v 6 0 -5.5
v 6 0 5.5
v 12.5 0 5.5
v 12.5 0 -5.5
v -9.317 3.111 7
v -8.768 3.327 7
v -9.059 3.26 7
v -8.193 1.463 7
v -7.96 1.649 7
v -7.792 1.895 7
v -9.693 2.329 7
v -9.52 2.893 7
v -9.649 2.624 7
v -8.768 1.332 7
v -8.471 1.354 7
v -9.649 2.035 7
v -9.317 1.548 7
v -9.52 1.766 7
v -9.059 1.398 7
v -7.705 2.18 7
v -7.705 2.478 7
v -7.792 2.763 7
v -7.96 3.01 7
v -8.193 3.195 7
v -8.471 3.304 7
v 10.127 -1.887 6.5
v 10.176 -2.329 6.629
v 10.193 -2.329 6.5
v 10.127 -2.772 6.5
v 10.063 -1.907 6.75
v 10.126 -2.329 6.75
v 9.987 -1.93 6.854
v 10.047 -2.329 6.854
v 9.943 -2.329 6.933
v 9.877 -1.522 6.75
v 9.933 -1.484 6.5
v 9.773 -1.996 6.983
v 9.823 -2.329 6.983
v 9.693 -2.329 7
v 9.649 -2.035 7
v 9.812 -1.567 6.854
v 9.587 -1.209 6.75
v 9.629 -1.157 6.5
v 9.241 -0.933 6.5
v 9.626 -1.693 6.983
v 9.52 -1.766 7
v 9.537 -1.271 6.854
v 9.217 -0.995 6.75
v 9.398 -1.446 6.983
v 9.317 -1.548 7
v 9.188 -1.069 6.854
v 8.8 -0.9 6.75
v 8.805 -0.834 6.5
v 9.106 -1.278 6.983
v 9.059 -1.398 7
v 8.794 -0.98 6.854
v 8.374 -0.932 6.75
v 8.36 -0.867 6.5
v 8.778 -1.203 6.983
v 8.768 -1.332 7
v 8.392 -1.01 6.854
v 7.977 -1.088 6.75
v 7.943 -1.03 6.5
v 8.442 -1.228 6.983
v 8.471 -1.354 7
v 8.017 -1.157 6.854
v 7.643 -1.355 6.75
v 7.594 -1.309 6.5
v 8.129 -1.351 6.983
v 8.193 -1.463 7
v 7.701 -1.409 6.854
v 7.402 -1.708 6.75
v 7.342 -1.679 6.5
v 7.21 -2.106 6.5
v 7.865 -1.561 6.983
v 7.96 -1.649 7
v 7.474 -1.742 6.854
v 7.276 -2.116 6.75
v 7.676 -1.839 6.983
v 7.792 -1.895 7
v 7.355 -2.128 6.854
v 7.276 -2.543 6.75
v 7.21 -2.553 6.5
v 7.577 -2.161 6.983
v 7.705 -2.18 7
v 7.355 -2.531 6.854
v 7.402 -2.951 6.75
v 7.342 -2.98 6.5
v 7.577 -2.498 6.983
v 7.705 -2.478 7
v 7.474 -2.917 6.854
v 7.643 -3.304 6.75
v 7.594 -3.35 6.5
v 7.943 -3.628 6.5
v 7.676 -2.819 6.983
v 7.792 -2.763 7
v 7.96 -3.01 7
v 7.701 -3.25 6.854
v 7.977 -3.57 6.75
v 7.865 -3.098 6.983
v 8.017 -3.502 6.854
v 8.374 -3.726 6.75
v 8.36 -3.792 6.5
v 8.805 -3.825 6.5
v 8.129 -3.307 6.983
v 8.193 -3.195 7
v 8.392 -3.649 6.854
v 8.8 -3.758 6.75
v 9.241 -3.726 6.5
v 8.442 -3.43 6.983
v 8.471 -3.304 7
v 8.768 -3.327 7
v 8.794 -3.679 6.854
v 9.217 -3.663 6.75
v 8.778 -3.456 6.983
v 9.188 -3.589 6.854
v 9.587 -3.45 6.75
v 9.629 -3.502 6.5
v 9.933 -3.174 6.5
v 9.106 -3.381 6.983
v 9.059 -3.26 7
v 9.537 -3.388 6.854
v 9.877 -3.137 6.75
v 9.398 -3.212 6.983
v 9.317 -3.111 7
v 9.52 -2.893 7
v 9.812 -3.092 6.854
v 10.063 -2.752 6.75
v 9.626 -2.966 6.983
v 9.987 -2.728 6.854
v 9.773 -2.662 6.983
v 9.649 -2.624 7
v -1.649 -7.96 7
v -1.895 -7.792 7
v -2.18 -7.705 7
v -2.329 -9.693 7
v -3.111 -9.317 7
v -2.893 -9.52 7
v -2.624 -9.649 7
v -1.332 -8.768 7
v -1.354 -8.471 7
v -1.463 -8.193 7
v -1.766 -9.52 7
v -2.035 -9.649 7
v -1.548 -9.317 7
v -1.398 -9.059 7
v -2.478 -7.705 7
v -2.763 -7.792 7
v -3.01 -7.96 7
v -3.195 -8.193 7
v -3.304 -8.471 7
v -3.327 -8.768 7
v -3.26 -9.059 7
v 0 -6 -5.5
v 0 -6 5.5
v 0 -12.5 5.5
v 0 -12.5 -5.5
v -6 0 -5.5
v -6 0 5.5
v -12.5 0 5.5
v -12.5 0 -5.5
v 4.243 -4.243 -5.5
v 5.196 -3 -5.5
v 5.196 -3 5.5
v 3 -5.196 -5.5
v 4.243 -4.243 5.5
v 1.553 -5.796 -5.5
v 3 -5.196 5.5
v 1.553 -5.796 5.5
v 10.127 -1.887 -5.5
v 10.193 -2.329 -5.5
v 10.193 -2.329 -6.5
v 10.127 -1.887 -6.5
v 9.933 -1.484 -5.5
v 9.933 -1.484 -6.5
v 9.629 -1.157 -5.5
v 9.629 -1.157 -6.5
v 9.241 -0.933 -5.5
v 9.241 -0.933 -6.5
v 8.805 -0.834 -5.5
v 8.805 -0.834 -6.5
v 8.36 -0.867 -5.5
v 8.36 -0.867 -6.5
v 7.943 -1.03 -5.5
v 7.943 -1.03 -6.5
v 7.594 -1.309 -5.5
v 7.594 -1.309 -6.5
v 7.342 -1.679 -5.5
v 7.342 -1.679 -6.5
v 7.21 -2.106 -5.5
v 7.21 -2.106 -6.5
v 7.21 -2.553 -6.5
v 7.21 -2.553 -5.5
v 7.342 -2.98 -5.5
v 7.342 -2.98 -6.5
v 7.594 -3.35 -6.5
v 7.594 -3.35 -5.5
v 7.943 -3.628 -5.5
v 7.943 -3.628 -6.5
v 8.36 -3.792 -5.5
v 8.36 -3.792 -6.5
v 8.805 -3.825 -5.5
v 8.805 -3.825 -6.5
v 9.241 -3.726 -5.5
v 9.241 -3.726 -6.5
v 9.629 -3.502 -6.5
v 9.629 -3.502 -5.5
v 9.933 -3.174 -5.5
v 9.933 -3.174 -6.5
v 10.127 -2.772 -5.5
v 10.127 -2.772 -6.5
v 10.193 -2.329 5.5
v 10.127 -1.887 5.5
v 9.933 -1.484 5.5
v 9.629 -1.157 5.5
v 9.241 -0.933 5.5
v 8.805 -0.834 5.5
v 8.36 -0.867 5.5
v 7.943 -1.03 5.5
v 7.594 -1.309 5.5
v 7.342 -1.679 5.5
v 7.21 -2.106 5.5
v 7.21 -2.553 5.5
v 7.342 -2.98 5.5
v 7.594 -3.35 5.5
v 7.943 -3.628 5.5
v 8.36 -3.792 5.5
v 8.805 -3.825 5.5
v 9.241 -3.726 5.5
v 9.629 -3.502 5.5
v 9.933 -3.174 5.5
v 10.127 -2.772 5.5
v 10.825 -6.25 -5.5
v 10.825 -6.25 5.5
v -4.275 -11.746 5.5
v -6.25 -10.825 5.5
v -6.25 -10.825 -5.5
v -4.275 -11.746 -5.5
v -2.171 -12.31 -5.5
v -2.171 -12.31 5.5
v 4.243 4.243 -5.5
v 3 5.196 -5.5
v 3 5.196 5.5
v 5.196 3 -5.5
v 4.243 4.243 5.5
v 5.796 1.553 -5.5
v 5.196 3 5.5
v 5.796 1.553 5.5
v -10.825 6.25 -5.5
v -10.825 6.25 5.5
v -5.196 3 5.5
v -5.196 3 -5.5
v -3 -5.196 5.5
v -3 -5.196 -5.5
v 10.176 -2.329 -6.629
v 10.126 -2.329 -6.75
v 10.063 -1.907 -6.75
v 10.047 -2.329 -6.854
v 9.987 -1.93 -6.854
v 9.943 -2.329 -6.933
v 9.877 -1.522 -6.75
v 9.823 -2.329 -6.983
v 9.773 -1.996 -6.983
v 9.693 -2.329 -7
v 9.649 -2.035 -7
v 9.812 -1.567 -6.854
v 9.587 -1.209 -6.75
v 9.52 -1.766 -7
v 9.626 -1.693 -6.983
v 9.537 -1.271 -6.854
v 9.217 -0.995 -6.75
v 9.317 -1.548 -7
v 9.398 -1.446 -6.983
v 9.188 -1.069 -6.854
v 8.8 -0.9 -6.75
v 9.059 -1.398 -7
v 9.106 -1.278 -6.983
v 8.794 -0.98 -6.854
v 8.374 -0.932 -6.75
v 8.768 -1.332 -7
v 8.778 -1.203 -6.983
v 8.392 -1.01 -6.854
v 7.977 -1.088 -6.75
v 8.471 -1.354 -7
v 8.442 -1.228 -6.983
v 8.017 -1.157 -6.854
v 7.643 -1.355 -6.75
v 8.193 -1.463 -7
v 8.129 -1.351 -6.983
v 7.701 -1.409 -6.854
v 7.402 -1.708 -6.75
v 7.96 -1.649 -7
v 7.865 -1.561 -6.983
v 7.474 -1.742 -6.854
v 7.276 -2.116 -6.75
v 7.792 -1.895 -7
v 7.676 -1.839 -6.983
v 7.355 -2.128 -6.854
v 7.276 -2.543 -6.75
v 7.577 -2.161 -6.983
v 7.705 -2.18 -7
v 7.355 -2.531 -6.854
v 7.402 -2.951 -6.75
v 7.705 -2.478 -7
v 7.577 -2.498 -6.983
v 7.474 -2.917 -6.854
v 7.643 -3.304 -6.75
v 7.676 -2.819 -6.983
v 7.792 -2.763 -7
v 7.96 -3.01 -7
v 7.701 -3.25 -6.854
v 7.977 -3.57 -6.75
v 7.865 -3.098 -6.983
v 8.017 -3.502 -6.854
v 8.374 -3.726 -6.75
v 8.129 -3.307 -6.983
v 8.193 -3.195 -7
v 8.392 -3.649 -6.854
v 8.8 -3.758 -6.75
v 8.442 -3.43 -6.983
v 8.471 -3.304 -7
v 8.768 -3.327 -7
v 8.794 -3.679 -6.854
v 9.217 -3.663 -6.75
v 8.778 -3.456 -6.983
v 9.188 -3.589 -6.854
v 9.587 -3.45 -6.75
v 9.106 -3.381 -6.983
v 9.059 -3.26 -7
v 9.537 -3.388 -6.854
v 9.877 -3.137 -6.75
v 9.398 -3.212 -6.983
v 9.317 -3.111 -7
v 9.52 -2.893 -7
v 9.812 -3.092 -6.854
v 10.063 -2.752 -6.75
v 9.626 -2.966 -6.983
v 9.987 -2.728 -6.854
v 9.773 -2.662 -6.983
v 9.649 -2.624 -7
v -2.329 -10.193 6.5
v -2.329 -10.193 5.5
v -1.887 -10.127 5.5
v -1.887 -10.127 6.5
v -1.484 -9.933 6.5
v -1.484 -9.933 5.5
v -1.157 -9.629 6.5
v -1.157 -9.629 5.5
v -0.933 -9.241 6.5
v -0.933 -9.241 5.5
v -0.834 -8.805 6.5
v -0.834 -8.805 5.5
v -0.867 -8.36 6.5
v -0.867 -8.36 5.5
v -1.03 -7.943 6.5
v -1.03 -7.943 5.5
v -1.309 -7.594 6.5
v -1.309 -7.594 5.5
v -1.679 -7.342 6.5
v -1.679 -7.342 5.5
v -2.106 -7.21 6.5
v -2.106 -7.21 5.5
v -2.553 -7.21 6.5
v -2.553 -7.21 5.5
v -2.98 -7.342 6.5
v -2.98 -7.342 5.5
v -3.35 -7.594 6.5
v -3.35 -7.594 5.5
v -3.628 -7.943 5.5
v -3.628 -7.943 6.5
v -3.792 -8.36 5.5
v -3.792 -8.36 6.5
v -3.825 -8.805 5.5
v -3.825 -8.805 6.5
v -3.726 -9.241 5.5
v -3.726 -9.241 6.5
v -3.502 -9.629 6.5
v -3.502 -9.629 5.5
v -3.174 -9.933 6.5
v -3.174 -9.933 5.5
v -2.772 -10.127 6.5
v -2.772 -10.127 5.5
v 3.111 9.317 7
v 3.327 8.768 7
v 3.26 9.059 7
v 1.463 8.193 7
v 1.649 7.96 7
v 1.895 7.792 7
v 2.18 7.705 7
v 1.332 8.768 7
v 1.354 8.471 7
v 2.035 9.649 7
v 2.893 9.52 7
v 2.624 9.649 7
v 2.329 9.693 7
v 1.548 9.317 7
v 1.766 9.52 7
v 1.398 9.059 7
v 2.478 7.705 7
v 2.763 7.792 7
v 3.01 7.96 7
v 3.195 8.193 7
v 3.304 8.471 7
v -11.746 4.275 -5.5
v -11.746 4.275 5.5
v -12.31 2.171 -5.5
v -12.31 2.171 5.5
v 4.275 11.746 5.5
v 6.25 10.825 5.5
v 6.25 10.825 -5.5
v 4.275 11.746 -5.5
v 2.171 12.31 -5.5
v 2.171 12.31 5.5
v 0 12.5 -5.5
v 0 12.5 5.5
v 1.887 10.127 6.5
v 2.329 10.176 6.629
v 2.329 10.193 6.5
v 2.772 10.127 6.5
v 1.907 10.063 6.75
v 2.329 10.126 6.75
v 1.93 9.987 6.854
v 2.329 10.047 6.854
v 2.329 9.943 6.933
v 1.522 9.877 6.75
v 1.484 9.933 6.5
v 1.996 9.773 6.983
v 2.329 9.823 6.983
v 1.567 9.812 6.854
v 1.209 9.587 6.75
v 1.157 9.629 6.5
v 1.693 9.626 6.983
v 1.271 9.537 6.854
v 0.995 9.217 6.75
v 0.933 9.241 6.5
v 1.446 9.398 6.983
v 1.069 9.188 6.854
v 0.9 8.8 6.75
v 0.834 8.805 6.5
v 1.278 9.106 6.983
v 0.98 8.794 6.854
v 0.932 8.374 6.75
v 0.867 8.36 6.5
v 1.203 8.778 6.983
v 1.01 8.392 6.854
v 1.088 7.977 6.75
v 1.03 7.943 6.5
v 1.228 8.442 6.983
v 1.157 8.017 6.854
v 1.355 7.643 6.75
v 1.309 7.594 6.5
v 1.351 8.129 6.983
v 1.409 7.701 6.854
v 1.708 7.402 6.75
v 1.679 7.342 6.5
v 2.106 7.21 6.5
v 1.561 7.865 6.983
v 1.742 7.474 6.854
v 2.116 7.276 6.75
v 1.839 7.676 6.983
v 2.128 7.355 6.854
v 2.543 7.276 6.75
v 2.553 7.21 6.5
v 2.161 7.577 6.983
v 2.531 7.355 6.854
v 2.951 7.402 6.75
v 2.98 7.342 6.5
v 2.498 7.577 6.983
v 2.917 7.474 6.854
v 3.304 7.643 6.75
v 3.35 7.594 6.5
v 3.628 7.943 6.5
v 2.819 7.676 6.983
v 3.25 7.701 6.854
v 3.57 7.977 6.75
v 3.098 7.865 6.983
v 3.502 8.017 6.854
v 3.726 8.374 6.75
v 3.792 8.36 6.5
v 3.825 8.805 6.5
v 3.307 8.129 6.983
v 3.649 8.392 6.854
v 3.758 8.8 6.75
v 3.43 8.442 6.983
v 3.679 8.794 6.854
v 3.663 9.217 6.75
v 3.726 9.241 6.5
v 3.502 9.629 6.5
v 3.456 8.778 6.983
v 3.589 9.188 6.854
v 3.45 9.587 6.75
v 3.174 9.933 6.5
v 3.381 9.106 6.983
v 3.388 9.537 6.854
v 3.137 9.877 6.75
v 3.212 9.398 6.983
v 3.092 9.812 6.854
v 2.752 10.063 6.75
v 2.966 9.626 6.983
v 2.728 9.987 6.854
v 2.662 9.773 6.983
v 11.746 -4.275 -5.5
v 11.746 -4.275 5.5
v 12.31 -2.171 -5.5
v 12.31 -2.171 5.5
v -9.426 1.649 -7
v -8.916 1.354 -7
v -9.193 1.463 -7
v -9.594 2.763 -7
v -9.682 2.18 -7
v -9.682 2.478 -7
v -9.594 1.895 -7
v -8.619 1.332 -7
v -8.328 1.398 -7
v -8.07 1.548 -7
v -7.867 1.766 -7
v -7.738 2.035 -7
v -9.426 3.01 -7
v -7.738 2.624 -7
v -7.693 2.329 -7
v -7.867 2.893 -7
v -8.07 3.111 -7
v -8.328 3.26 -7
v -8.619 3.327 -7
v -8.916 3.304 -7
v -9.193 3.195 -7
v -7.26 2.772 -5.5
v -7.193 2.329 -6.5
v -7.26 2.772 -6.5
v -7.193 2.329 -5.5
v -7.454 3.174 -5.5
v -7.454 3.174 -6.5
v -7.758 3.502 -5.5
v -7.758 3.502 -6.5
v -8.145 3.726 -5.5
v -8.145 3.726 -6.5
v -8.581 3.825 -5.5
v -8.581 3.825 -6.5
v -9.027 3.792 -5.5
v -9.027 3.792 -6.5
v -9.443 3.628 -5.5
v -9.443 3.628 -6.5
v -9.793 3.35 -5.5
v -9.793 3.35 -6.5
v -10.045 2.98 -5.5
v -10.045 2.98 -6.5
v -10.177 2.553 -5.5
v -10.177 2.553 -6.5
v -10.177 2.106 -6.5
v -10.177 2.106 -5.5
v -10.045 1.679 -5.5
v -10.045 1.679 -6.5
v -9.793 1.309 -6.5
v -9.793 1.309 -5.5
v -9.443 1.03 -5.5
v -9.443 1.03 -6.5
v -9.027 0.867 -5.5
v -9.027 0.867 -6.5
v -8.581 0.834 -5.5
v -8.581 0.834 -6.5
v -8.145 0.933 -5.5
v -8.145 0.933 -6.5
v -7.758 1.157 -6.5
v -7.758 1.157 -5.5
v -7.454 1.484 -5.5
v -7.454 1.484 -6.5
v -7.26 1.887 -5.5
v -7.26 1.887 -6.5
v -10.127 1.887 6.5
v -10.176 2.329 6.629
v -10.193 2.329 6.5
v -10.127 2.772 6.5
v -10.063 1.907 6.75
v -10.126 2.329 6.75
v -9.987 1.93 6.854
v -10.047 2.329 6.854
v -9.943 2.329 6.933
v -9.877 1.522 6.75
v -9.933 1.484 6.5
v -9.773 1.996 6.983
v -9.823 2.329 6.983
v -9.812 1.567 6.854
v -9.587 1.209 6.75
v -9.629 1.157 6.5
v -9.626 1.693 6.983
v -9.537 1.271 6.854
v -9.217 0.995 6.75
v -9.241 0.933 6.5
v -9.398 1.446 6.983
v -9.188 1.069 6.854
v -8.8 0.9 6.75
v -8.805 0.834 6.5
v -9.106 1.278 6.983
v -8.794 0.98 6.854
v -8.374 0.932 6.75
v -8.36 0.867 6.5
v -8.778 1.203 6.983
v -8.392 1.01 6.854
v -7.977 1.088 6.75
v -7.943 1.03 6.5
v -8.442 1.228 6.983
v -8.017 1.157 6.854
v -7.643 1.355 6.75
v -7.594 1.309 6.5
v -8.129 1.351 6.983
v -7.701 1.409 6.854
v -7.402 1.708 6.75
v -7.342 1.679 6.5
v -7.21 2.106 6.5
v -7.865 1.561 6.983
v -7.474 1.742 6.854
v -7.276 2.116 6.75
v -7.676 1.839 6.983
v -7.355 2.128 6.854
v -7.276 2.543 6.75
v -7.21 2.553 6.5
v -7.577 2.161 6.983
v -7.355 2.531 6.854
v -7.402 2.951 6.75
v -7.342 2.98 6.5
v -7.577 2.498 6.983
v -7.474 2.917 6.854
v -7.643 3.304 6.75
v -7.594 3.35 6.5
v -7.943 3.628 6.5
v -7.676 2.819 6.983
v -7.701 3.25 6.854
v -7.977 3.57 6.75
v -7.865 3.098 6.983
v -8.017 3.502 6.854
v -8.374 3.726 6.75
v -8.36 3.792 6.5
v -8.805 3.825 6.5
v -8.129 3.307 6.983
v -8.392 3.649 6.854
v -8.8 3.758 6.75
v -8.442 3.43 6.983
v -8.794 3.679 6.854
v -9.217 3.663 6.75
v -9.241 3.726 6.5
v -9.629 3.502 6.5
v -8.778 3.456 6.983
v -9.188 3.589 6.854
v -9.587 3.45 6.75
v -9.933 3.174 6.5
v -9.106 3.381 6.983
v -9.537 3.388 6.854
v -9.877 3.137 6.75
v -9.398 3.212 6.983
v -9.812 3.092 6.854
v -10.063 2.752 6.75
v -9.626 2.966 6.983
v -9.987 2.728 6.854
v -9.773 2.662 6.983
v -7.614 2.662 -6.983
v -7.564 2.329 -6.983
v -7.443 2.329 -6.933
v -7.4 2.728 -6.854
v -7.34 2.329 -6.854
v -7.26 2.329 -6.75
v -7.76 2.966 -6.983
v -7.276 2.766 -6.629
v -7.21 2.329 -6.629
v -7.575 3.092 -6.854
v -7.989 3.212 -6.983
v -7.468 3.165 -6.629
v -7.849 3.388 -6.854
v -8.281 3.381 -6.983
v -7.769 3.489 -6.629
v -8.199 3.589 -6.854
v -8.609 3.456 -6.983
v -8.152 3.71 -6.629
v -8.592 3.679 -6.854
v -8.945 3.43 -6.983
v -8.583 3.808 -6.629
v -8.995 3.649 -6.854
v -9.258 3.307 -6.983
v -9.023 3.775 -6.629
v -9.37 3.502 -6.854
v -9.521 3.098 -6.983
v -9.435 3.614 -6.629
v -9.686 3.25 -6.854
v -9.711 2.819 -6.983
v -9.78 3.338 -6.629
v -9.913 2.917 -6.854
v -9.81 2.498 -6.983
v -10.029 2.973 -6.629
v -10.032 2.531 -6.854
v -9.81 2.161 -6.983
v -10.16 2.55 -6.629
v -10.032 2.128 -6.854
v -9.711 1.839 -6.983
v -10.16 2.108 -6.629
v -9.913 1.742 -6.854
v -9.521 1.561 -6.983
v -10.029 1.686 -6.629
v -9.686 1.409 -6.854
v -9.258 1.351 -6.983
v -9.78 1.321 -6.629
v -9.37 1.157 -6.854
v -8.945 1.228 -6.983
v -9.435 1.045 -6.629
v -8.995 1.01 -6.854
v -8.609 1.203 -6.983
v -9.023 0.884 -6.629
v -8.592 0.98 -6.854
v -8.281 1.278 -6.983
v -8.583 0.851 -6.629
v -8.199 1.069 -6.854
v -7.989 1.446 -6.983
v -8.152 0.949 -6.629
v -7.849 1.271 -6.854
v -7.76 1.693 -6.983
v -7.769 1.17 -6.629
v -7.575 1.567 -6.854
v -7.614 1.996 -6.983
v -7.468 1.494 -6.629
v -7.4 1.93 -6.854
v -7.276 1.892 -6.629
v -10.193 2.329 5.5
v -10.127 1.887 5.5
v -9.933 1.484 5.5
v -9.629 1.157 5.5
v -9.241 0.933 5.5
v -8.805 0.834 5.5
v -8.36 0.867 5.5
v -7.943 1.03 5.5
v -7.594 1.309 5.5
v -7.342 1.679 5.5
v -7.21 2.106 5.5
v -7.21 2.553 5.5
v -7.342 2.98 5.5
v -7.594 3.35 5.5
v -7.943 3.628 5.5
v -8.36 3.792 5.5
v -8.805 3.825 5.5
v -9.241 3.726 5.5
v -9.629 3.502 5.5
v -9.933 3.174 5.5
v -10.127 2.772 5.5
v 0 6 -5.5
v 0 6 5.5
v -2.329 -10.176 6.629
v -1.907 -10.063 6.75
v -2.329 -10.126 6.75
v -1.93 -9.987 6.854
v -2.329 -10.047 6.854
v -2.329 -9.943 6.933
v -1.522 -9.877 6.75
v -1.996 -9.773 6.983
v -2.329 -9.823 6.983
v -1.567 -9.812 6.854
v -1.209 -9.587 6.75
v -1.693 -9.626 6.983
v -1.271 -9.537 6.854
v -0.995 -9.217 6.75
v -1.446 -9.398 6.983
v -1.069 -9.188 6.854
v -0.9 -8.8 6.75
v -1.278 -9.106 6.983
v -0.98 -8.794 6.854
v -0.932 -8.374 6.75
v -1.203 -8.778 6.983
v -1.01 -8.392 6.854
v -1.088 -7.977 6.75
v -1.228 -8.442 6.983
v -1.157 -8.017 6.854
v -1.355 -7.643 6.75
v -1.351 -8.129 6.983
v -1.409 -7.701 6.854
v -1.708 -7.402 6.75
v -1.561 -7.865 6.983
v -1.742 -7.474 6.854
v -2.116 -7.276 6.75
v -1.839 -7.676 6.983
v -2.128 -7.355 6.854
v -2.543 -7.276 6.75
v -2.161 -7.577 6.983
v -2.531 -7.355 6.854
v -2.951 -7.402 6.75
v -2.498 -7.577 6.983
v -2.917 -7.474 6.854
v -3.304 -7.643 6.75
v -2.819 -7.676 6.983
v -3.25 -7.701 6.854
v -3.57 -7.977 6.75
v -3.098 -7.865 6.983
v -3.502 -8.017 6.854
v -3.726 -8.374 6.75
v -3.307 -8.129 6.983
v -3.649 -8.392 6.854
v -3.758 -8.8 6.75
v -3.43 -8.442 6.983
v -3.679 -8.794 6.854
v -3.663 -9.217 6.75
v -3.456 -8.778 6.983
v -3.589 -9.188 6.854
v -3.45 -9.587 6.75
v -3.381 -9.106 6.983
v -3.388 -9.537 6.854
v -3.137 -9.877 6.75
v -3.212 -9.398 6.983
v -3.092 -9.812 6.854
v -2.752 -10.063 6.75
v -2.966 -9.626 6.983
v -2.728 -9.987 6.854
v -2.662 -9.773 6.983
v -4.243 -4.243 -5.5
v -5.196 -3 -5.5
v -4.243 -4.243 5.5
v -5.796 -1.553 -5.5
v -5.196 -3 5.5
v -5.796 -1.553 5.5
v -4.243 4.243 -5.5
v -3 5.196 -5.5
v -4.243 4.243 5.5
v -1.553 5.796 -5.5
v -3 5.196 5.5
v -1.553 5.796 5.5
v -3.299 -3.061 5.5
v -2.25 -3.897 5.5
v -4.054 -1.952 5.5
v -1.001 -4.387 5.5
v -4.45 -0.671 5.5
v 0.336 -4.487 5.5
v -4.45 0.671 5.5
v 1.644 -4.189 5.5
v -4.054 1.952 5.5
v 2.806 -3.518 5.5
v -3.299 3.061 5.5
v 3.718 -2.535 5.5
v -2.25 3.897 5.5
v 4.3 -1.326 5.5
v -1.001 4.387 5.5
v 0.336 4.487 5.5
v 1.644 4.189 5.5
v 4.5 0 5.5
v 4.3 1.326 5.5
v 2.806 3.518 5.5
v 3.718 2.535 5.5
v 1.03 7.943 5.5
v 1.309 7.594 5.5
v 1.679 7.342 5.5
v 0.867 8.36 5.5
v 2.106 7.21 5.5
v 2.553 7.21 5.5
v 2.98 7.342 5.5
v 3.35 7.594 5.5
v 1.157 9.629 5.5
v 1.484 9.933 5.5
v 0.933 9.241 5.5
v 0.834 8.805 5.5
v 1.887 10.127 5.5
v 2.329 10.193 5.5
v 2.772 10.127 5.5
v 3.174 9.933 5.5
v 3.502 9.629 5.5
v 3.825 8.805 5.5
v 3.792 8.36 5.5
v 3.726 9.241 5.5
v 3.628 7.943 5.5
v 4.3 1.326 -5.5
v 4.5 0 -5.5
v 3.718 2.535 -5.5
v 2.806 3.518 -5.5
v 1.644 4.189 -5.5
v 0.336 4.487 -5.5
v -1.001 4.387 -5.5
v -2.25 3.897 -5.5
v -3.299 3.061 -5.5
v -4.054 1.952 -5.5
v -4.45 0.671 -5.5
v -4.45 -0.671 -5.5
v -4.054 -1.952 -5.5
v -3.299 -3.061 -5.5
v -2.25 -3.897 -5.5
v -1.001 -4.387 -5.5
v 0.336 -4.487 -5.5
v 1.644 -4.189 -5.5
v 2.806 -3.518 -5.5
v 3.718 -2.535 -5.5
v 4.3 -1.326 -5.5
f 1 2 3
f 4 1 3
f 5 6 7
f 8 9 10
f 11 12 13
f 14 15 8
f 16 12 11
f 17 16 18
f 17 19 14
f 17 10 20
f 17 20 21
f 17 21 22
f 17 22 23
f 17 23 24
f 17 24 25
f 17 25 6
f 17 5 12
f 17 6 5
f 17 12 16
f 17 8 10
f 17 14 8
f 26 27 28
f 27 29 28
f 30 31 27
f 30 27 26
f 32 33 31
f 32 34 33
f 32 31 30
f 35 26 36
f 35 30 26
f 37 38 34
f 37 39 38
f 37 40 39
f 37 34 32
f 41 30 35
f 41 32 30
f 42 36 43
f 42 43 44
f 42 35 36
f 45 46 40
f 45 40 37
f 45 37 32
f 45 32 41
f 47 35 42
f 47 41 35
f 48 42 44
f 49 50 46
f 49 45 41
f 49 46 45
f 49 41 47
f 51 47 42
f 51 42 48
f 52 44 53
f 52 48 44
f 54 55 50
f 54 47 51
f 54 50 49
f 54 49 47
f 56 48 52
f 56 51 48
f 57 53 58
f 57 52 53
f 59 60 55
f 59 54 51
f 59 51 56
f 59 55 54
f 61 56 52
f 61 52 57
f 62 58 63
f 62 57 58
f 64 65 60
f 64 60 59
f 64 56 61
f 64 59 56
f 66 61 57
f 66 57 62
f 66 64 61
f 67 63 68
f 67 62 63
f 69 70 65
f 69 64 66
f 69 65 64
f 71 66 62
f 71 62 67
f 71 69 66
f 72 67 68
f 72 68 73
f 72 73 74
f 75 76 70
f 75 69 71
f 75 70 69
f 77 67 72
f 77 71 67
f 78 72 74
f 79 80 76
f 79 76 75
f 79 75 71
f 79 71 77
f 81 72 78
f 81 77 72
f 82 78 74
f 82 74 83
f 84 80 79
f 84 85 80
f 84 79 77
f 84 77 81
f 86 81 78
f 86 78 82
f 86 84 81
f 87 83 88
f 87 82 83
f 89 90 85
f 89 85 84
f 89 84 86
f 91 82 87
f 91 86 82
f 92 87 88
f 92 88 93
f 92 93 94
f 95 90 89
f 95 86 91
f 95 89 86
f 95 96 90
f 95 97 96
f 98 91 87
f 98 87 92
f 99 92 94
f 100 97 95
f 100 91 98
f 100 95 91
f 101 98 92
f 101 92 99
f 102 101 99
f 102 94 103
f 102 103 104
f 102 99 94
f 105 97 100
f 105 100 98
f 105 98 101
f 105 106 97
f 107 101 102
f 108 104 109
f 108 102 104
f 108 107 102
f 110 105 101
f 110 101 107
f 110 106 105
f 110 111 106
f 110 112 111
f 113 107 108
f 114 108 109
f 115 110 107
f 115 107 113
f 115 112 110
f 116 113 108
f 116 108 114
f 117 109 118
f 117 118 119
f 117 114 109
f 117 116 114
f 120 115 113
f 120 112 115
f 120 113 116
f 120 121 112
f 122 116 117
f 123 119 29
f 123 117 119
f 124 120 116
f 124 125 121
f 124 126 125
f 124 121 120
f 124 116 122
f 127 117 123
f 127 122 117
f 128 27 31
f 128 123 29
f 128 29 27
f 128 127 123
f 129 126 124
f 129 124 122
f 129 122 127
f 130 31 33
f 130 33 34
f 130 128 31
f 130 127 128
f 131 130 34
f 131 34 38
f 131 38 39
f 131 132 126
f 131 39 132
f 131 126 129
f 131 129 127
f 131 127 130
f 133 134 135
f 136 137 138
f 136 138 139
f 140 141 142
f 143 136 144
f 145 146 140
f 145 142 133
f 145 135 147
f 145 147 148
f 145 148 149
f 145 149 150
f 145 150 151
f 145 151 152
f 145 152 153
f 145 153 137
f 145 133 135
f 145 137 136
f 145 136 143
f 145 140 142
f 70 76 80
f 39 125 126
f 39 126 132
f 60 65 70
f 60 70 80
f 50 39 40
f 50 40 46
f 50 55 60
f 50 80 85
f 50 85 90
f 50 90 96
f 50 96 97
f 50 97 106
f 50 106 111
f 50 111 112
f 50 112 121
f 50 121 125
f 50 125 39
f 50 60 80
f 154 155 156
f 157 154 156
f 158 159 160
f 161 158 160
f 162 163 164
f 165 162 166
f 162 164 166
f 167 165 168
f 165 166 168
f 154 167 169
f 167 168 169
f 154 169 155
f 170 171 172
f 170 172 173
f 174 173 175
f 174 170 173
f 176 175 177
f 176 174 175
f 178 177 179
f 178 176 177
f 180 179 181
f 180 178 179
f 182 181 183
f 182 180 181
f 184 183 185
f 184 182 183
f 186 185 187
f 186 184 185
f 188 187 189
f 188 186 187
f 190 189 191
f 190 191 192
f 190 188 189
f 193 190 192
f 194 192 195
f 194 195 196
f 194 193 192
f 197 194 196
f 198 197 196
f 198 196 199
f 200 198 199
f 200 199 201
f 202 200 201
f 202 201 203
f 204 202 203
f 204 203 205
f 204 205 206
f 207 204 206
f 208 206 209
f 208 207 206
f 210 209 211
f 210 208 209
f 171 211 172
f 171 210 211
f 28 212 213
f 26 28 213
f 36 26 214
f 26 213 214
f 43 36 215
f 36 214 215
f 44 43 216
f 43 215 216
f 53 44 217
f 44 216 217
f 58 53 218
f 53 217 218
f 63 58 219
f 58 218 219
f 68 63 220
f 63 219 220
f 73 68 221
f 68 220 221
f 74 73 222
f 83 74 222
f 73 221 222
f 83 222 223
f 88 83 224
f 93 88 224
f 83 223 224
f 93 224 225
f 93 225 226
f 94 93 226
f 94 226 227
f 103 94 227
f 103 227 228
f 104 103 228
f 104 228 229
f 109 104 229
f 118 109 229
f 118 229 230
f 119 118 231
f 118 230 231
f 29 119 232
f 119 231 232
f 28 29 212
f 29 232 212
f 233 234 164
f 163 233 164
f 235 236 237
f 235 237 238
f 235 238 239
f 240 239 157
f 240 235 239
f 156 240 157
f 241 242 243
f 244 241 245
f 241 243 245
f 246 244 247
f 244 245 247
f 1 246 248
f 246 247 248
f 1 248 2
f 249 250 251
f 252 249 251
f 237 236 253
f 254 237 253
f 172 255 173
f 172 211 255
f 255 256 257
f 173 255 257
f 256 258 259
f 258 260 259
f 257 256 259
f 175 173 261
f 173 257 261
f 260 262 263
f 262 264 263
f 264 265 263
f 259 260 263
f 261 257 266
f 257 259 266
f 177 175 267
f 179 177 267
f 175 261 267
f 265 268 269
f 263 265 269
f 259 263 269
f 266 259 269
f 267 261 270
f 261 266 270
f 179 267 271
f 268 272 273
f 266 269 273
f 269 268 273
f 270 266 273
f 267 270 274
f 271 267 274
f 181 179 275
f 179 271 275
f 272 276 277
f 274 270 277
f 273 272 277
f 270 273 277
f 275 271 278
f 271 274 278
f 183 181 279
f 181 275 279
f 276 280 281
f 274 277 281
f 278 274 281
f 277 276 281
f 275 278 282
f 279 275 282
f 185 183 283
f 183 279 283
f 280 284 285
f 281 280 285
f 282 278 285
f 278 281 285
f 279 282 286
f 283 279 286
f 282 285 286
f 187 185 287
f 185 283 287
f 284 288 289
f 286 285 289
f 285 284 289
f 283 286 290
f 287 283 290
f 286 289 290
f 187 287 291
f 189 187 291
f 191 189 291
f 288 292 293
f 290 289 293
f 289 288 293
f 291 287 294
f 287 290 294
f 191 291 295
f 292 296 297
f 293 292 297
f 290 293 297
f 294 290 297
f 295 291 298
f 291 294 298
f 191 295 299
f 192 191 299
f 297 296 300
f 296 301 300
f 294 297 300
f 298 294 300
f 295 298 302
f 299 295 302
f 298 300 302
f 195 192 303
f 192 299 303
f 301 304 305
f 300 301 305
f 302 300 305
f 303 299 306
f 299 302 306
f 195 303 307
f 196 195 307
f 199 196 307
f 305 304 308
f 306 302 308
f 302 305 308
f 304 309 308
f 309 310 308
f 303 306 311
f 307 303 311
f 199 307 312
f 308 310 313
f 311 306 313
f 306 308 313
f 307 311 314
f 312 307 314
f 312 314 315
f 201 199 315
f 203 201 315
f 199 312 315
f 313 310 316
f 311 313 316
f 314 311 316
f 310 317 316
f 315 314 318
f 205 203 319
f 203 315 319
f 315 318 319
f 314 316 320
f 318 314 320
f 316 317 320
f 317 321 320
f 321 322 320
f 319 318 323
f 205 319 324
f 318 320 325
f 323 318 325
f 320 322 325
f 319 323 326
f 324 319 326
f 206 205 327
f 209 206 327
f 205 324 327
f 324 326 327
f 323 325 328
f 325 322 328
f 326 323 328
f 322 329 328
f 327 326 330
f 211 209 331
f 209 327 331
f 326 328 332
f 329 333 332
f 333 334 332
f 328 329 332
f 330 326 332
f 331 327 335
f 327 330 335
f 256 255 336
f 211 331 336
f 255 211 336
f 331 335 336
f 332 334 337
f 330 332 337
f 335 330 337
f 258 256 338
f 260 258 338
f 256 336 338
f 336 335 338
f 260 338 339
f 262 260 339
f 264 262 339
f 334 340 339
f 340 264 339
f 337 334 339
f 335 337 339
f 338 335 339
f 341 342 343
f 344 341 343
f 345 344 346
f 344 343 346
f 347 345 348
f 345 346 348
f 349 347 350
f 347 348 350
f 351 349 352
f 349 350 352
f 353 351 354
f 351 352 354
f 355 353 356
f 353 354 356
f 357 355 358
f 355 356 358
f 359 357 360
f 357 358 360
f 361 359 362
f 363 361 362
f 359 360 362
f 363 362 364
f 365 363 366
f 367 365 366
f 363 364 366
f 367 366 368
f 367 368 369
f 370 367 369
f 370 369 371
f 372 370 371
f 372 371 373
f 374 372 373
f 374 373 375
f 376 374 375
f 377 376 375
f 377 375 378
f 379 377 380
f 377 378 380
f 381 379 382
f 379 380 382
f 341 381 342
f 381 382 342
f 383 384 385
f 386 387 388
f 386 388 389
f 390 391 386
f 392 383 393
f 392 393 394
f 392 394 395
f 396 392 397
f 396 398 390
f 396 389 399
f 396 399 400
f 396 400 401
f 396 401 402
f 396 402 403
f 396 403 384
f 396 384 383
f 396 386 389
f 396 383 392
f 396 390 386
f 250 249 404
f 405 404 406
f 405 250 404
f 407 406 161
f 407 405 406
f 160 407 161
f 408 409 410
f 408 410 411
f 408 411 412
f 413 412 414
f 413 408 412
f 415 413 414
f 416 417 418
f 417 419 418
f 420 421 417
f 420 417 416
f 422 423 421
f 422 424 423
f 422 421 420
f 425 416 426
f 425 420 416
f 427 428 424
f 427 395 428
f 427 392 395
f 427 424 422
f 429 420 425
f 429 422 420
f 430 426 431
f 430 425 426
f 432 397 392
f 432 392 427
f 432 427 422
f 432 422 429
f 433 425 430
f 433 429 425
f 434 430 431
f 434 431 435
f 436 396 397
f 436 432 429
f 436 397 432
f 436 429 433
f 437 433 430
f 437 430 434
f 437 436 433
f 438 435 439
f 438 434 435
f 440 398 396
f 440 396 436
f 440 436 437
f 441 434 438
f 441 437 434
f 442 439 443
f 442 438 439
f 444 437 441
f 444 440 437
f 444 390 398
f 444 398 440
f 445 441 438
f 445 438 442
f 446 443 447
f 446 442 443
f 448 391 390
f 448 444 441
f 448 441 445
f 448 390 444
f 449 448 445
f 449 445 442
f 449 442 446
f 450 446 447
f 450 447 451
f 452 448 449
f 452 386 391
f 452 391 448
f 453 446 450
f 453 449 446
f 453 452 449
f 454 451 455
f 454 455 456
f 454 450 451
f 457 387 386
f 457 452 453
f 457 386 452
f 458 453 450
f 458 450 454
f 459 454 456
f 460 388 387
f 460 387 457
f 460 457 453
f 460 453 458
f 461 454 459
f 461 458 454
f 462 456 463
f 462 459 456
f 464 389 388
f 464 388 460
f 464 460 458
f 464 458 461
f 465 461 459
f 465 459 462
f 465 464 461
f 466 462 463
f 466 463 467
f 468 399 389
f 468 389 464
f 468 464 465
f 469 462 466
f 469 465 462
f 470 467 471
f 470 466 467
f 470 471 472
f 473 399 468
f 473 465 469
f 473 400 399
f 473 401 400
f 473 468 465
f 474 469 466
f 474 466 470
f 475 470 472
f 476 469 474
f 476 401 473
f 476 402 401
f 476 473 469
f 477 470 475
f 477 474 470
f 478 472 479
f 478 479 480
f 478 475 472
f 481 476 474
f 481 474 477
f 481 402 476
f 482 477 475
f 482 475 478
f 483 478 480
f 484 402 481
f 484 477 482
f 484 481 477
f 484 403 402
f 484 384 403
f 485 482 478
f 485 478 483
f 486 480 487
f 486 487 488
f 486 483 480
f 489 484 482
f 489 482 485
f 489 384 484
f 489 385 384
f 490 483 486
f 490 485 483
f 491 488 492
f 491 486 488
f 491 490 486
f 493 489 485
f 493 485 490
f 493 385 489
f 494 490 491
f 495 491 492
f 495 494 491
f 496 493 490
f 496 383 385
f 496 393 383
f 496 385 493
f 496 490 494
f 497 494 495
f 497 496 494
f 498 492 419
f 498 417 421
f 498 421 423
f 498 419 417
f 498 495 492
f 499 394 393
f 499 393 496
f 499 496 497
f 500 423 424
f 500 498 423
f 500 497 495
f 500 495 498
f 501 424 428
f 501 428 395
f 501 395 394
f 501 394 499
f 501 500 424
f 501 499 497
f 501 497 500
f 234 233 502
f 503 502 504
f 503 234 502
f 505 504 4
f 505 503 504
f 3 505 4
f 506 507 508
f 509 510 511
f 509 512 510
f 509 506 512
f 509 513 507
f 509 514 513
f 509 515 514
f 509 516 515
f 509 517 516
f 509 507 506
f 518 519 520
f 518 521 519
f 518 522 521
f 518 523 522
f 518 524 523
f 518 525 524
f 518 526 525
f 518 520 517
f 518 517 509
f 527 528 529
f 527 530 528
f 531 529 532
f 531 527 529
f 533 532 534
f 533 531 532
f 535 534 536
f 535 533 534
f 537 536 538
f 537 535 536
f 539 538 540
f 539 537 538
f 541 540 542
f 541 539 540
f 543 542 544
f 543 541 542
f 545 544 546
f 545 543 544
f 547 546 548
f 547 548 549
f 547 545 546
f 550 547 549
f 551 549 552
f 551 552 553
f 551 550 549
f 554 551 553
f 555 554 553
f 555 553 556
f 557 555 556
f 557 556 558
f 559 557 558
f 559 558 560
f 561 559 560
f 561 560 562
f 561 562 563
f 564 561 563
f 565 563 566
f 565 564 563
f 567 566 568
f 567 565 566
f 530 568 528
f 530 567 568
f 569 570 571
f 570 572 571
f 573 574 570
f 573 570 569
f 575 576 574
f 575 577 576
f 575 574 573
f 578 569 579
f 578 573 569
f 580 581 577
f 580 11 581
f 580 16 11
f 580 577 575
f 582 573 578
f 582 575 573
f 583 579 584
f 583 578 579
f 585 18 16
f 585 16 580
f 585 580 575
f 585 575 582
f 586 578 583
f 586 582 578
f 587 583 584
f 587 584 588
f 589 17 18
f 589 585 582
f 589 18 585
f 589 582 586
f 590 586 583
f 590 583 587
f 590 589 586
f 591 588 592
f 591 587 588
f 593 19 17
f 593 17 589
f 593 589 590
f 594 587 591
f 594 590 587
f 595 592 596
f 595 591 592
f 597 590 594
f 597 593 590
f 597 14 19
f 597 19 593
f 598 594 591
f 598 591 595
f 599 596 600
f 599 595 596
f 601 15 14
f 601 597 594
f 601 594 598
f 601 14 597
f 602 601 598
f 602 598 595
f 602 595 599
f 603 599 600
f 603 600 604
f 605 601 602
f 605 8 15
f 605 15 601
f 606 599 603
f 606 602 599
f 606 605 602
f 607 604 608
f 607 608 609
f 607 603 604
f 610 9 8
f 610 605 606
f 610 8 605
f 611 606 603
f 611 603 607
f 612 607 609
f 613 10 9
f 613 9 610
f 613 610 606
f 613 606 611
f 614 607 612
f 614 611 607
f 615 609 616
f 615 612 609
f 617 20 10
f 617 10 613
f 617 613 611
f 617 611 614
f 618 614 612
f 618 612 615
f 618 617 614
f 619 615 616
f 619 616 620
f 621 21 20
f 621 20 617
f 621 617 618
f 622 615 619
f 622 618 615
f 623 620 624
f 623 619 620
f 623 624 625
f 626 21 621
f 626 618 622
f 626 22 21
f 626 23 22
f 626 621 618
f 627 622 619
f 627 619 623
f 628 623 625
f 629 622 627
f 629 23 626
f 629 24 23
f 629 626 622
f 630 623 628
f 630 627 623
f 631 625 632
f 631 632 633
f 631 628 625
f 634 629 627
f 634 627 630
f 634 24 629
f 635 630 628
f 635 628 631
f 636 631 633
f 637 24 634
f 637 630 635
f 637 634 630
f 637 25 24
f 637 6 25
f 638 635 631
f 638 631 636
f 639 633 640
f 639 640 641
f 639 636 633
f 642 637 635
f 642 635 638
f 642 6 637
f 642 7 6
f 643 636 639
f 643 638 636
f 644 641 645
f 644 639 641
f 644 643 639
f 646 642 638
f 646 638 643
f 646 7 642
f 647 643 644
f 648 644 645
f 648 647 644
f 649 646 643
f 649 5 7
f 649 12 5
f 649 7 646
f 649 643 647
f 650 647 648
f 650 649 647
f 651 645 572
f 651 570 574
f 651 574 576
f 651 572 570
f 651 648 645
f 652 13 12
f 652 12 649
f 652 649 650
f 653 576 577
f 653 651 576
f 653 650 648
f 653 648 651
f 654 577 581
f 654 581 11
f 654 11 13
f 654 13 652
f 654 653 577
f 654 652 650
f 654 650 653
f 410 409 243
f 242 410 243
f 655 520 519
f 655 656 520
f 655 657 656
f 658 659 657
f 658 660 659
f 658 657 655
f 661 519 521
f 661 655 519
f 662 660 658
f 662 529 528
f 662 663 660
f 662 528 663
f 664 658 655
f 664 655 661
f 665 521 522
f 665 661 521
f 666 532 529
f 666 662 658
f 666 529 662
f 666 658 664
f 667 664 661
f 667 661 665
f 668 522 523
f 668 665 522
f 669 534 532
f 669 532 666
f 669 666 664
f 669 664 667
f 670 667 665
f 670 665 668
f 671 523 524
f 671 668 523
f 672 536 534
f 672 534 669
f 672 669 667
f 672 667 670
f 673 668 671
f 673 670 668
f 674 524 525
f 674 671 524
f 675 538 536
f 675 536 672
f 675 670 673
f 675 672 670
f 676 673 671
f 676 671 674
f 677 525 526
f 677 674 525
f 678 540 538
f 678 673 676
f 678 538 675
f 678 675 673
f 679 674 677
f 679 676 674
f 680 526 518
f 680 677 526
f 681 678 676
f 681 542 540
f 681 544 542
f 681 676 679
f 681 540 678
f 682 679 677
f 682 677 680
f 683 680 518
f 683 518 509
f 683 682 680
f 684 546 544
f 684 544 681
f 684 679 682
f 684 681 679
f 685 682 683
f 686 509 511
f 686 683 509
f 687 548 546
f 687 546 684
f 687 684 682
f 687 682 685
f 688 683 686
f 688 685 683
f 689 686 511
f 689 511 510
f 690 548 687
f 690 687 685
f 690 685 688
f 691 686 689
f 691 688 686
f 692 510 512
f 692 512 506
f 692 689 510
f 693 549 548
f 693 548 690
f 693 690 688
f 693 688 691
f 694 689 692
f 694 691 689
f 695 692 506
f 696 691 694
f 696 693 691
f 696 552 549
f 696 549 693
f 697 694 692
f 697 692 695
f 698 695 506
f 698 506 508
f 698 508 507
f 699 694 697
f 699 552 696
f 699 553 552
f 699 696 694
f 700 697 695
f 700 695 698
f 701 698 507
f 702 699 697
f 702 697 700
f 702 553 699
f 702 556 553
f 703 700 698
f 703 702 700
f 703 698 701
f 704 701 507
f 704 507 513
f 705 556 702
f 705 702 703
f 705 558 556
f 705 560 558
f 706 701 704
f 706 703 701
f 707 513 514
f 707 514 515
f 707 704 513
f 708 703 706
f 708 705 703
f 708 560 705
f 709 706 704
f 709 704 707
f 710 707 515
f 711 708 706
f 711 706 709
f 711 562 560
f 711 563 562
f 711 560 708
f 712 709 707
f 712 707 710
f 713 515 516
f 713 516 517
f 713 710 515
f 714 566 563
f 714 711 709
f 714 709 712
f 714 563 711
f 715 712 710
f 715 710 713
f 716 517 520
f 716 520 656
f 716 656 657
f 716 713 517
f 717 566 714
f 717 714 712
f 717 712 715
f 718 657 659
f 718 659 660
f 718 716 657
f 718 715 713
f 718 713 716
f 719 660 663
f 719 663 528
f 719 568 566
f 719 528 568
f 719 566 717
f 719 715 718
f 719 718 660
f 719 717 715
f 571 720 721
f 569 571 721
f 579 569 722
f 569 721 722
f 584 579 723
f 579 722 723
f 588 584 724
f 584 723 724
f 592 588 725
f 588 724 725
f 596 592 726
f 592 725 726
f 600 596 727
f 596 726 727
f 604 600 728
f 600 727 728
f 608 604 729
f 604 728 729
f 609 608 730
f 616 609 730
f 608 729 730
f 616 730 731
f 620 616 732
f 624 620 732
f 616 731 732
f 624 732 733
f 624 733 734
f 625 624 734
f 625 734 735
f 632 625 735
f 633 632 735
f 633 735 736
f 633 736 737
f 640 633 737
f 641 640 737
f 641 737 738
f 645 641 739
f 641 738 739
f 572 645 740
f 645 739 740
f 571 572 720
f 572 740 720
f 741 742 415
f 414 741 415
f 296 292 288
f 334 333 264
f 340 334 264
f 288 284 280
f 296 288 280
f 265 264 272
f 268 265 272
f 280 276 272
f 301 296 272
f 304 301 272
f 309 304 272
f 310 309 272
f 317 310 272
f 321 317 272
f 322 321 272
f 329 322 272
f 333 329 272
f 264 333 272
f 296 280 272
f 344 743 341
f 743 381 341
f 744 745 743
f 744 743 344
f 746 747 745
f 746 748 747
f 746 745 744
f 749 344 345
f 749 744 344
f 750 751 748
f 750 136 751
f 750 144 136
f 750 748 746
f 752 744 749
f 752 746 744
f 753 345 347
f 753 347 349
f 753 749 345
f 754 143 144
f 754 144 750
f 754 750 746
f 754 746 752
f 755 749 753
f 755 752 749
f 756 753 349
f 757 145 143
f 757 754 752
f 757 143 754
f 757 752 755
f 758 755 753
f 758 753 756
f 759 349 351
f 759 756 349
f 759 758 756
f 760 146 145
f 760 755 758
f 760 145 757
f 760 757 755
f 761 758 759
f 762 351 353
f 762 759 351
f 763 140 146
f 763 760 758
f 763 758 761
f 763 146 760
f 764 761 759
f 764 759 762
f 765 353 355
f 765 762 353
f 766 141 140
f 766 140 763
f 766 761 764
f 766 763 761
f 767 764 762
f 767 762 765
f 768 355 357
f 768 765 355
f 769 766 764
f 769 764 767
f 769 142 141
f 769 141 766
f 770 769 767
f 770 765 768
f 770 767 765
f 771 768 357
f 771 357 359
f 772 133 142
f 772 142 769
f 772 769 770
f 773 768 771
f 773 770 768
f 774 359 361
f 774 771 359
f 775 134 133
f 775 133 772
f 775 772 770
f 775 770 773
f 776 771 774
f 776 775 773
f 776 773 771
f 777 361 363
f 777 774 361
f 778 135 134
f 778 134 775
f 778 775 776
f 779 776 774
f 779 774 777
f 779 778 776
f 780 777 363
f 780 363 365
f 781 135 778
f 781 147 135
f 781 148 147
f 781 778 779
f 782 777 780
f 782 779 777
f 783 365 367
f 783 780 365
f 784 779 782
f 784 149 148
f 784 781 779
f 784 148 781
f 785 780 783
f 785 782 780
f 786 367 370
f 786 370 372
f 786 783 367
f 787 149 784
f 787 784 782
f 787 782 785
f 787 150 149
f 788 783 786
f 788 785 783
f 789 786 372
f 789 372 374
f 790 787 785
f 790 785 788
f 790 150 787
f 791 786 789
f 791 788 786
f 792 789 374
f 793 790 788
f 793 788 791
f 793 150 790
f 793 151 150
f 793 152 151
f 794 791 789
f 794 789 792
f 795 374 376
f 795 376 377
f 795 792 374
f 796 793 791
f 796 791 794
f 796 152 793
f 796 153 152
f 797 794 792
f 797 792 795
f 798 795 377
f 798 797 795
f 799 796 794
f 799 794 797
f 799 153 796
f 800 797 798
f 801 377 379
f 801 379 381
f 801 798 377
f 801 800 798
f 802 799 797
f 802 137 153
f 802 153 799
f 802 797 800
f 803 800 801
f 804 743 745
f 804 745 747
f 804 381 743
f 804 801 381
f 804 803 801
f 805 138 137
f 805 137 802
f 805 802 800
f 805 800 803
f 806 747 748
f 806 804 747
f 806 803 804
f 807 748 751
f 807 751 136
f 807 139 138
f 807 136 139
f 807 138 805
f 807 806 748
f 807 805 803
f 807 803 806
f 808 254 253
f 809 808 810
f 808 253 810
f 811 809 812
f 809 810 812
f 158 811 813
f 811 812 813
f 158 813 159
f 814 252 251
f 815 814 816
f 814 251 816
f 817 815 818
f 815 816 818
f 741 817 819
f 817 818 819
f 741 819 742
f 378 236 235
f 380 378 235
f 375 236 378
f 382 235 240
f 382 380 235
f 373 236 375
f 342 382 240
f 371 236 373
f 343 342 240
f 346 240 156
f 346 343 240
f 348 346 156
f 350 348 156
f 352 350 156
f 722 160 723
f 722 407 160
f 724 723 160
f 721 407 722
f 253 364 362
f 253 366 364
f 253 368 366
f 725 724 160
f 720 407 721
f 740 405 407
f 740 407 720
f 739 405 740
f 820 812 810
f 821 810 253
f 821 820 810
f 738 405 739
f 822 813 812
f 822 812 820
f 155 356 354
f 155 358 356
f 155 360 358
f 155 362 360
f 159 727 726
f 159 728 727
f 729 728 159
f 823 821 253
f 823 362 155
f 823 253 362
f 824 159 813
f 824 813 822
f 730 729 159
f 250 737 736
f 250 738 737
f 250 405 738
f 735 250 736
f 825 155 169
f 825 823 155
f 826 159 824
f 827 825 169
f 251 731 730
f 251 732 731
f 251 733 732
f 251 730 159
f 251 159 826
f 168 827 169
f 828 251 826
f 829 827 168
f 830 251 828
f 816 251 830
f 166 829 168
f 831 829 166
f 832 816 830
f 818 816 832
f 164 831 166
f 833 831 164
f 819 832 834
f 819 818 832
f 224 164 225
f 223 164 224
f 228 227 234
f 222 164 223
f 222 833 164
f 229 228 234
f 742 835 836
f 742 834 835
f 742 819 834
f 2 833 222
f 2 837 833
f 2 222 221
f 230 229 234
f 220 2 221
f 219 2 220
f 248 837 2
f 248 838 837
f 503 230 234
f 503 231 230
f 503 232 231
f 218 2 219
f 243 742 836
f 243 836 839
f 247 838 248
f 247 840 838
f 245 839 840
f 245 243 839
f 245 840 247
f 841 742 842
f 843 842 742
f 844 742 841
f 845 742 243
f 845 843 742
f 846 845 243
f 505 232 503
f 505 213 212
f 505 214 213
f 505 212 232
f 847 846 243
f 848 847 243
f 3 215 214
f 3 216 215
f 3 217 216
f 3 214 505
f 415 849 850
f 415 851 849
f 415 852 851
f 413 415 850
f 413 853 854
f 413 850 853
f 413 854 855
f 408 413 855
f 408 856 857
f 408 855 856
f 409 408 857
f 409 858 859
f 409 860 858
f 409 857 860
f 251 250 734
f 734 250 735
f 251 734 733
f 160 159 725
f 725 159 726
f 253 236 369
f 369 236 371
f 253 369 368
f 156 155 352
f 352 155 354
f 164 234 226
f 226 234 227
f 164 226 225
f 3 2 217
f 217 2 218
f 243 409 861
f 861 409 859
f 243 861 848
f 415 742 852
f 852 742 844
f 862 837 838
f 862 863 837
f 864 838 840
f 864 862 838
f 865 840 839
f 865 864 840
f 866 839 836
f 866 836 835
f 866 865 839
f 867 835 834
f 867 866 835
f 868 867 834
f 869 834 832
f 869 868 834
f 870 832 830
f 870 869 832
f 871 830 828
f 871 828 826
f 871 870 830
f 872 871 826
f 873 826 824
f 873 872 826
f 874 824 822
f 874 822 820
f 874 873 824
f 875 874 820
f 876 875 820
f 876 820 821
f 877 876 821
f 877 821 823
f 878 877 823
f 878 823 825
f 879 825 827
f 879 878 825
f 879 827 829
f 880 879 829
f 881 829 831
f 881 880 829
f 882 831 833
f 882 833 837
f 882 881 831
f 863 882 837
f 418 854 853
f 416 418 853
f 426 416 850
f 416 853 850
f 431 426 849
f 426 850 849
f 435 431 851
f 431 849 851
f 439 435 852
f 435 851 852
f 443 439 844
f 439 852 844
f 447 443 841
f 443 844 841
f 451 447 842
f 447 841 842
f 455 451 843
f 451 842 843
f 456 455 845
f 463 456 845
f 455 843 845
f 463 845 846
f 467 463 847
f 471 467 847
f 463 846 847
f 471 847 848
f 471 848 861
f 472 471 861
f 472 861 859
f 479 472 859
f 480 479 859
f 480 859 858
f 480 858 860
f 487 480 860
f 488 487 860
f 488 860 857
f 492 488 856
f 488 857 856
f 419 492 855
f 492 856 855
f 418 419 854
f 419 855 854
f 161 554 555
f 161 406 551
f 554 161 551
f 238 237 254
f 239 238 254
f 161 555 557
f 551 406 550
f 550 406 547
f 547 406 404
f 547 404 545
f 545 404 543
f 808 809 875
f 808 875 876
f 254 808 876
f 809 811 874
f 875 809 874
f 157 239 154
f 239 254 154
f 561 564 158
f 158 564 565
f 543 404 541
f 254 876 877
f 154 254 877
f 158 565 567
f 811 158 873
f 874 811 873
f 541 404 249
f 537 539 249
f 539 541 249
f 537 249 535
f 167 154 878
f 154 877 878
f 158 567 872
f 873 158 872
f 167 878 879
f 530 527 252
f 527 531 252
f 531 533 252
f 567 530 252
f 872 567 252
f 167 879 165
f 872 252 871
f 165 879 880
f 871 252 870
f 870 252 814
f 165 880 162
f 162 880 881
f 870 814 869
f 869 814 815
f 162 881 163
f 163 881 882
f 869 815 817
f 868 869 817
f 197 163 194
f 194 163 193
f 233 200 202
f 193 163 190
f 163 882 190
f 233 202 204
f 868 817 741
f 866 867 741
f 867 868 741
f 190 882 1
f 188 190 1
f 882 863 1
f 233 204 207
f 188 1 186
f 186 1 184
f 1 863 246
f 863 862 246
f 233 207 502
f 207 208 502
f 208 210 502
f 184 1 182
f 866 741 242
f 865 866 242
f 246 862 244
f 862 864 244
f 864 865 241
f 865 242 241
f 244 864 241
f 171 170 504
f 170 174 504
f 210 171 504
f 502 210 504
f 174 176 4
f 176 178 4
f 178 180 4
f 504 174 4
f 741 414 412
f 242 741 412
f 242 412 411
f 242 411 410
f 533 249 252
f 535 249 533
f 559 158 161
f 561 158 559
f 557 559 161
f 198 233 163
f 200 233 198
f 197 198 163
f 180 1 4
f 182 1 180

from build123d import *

# Parameters (mm, degrees)
ESBO_O1_R                    = 12.5
ESBO_O1_R_2                  = 4.5
RESSALTO_EXTRUS_O1_DEPTH     = 5.5
CORTE_EXTRUS_O2_DEPTH        = 21.820662814
PADR_OCIRCULAR1_COUNT        = 4
ESBO_O4_R                    = 1.5
RESSALTO_EXTRUS_O2_DEPTH     = 1.5
FILETE1_R                    = 0.5
FILETE1_OF_ESPELHAR1_R       = 0.5
PADR_OCIRCULAR2_COUNT        = 4
FILETE1_OF_PADR_OCIRCULAR2_R = 0.5


# Read off the part's stored shape, not the designer's step: PadrãoCircular3
with BuildPart() as part:
    # Esboço1 → Ressalto-extrusão1 (new, symmetric)
    with BuildSketch(Plane.XY):
        Circle(ESBO_O1_R)
        Circle(ESBO_O1_R_2, mode=Mode.SUBTRACT)
    extrude(amount=RESSALTO_EXTRUS_O1_DEPTH, both=True)

    # Esboço3 → Corte-extrusão2 (cut, through all)
    with BuildSketch(Plane.XY.offset(5.5)):
        with BuildLine():
            Line((-10.825317547, 6.25), (-5.196152423, 3))
            ThreePointArc((-5.196152423, 3), (-3, 5.196152423), (0, 6))
            Line((0, 6), (0, 12.5))
            ThreePointArc((0, 12.5), (-6.25, 10.825317547), (-10.825317547, 6.25))
        make_face()
    corte_extrus_o2 = extrude(amount=-CORTE_EXTRUS_O2_DEPTH, mode=Mode.SUBTRACT)

    # PadrãoCircular1: Corte-extrusão2 ×4 about axis
    padr_ocircular1_axis = Axis((0, 0, 5.5), (0, 0, -1))
    for i in range(1, PADR_OCIRCULAR1_COUNT):
        add(corte_extrus_o2.rotate(padr_ocircular1_axis, i * 360 / PADR_OCIRCULAR1_COUNT), mode=Mode.SUBTRACT)

    # Esboço4 → Ressalto-extrusão2 (add)
    with BuildSketch(Plane.XY.offset(5.5)):
        with Locations((8.693332437, -2.329371406)):
            Circle(ESBO_O4_R)
    ressalto_extrus_o2 = extrude(amount=RESSALTO_EXTRUS_O2_DEPTH)

    # Filete1
    filete1_edges = [part.edges().sort_by_distance(p)[0] for p in [
        (7.193332437, -2.329371406, 7),
    ]]
    fillet(filete1_edges, radius=FILETE1_R)

    # Espelhar1: Ressalto-extrusão2 across plane
    add(ressalto_extrus_o2.mirror(Plane.XY))

    # Filete1 of Espelhar1
    filete1_of_espelhar1_edges = [part.edges().sort_by_distance(p)[0] for p in [
        (7.193332437, -2.329371406, -7),
    ]]
    fillet(filete1_of_espelhar1_edges, radius=FILETE1_OF_ESPELHAR1_R)

    # PadrãoCircular2: Ressalto-extrusão2 ×4 about axis
    padr_ocircular2_axis = Axis((0, 0, 0), (0, 0, 1))
    for i in range(1, PADR_OCIRCULAR2_COUNT):
        add(ressalto_extrus_o2.rotate(padr_ocircular2_axis, i * 360 / PADR_OCIRCULAR2_COUNT))

    # Filete1 of PadrãoCircular2
    filete1_of_padr_ocircular2_edges = [part.edges().sort_by_distance(p)[0] for p in [
        (2.329371406, 7.193332437, 7),
        (-7.193332437, 2.329371406, 7),
        (-2.329371406, -7.193332437, 7),
    ]]
    fillet(filete1_of_padr_ocircular2_edges, radius=FILETE1_OF_PADR_OCIRCULAR2_R)

    # PadrãoCircular3 outline → PadrãoCircular3 (revolve)
    with BuildSketch(Plane(origin=(-8.693332437, 2.329371406, 0), x_dir=(1, 0, 0), z_dir=(0, -1, 0))):
        with BuildLine():
            Line((0, -5.5), (0, -7))
            Line((0, -7), (1, -7))
            ThreePointArc((1, -7), (1.353553391, -6.853553391), (1.5, -6.5))
            Line((1.5, -6.5), (1.5, -5.5))
            Line((1.5, -5.5), (0, -5.5))
        make_face()
    revolve(axis=Axis((-8.693332437, 2.329371406, 0), (0, 0, 1)))


solid = part.part
